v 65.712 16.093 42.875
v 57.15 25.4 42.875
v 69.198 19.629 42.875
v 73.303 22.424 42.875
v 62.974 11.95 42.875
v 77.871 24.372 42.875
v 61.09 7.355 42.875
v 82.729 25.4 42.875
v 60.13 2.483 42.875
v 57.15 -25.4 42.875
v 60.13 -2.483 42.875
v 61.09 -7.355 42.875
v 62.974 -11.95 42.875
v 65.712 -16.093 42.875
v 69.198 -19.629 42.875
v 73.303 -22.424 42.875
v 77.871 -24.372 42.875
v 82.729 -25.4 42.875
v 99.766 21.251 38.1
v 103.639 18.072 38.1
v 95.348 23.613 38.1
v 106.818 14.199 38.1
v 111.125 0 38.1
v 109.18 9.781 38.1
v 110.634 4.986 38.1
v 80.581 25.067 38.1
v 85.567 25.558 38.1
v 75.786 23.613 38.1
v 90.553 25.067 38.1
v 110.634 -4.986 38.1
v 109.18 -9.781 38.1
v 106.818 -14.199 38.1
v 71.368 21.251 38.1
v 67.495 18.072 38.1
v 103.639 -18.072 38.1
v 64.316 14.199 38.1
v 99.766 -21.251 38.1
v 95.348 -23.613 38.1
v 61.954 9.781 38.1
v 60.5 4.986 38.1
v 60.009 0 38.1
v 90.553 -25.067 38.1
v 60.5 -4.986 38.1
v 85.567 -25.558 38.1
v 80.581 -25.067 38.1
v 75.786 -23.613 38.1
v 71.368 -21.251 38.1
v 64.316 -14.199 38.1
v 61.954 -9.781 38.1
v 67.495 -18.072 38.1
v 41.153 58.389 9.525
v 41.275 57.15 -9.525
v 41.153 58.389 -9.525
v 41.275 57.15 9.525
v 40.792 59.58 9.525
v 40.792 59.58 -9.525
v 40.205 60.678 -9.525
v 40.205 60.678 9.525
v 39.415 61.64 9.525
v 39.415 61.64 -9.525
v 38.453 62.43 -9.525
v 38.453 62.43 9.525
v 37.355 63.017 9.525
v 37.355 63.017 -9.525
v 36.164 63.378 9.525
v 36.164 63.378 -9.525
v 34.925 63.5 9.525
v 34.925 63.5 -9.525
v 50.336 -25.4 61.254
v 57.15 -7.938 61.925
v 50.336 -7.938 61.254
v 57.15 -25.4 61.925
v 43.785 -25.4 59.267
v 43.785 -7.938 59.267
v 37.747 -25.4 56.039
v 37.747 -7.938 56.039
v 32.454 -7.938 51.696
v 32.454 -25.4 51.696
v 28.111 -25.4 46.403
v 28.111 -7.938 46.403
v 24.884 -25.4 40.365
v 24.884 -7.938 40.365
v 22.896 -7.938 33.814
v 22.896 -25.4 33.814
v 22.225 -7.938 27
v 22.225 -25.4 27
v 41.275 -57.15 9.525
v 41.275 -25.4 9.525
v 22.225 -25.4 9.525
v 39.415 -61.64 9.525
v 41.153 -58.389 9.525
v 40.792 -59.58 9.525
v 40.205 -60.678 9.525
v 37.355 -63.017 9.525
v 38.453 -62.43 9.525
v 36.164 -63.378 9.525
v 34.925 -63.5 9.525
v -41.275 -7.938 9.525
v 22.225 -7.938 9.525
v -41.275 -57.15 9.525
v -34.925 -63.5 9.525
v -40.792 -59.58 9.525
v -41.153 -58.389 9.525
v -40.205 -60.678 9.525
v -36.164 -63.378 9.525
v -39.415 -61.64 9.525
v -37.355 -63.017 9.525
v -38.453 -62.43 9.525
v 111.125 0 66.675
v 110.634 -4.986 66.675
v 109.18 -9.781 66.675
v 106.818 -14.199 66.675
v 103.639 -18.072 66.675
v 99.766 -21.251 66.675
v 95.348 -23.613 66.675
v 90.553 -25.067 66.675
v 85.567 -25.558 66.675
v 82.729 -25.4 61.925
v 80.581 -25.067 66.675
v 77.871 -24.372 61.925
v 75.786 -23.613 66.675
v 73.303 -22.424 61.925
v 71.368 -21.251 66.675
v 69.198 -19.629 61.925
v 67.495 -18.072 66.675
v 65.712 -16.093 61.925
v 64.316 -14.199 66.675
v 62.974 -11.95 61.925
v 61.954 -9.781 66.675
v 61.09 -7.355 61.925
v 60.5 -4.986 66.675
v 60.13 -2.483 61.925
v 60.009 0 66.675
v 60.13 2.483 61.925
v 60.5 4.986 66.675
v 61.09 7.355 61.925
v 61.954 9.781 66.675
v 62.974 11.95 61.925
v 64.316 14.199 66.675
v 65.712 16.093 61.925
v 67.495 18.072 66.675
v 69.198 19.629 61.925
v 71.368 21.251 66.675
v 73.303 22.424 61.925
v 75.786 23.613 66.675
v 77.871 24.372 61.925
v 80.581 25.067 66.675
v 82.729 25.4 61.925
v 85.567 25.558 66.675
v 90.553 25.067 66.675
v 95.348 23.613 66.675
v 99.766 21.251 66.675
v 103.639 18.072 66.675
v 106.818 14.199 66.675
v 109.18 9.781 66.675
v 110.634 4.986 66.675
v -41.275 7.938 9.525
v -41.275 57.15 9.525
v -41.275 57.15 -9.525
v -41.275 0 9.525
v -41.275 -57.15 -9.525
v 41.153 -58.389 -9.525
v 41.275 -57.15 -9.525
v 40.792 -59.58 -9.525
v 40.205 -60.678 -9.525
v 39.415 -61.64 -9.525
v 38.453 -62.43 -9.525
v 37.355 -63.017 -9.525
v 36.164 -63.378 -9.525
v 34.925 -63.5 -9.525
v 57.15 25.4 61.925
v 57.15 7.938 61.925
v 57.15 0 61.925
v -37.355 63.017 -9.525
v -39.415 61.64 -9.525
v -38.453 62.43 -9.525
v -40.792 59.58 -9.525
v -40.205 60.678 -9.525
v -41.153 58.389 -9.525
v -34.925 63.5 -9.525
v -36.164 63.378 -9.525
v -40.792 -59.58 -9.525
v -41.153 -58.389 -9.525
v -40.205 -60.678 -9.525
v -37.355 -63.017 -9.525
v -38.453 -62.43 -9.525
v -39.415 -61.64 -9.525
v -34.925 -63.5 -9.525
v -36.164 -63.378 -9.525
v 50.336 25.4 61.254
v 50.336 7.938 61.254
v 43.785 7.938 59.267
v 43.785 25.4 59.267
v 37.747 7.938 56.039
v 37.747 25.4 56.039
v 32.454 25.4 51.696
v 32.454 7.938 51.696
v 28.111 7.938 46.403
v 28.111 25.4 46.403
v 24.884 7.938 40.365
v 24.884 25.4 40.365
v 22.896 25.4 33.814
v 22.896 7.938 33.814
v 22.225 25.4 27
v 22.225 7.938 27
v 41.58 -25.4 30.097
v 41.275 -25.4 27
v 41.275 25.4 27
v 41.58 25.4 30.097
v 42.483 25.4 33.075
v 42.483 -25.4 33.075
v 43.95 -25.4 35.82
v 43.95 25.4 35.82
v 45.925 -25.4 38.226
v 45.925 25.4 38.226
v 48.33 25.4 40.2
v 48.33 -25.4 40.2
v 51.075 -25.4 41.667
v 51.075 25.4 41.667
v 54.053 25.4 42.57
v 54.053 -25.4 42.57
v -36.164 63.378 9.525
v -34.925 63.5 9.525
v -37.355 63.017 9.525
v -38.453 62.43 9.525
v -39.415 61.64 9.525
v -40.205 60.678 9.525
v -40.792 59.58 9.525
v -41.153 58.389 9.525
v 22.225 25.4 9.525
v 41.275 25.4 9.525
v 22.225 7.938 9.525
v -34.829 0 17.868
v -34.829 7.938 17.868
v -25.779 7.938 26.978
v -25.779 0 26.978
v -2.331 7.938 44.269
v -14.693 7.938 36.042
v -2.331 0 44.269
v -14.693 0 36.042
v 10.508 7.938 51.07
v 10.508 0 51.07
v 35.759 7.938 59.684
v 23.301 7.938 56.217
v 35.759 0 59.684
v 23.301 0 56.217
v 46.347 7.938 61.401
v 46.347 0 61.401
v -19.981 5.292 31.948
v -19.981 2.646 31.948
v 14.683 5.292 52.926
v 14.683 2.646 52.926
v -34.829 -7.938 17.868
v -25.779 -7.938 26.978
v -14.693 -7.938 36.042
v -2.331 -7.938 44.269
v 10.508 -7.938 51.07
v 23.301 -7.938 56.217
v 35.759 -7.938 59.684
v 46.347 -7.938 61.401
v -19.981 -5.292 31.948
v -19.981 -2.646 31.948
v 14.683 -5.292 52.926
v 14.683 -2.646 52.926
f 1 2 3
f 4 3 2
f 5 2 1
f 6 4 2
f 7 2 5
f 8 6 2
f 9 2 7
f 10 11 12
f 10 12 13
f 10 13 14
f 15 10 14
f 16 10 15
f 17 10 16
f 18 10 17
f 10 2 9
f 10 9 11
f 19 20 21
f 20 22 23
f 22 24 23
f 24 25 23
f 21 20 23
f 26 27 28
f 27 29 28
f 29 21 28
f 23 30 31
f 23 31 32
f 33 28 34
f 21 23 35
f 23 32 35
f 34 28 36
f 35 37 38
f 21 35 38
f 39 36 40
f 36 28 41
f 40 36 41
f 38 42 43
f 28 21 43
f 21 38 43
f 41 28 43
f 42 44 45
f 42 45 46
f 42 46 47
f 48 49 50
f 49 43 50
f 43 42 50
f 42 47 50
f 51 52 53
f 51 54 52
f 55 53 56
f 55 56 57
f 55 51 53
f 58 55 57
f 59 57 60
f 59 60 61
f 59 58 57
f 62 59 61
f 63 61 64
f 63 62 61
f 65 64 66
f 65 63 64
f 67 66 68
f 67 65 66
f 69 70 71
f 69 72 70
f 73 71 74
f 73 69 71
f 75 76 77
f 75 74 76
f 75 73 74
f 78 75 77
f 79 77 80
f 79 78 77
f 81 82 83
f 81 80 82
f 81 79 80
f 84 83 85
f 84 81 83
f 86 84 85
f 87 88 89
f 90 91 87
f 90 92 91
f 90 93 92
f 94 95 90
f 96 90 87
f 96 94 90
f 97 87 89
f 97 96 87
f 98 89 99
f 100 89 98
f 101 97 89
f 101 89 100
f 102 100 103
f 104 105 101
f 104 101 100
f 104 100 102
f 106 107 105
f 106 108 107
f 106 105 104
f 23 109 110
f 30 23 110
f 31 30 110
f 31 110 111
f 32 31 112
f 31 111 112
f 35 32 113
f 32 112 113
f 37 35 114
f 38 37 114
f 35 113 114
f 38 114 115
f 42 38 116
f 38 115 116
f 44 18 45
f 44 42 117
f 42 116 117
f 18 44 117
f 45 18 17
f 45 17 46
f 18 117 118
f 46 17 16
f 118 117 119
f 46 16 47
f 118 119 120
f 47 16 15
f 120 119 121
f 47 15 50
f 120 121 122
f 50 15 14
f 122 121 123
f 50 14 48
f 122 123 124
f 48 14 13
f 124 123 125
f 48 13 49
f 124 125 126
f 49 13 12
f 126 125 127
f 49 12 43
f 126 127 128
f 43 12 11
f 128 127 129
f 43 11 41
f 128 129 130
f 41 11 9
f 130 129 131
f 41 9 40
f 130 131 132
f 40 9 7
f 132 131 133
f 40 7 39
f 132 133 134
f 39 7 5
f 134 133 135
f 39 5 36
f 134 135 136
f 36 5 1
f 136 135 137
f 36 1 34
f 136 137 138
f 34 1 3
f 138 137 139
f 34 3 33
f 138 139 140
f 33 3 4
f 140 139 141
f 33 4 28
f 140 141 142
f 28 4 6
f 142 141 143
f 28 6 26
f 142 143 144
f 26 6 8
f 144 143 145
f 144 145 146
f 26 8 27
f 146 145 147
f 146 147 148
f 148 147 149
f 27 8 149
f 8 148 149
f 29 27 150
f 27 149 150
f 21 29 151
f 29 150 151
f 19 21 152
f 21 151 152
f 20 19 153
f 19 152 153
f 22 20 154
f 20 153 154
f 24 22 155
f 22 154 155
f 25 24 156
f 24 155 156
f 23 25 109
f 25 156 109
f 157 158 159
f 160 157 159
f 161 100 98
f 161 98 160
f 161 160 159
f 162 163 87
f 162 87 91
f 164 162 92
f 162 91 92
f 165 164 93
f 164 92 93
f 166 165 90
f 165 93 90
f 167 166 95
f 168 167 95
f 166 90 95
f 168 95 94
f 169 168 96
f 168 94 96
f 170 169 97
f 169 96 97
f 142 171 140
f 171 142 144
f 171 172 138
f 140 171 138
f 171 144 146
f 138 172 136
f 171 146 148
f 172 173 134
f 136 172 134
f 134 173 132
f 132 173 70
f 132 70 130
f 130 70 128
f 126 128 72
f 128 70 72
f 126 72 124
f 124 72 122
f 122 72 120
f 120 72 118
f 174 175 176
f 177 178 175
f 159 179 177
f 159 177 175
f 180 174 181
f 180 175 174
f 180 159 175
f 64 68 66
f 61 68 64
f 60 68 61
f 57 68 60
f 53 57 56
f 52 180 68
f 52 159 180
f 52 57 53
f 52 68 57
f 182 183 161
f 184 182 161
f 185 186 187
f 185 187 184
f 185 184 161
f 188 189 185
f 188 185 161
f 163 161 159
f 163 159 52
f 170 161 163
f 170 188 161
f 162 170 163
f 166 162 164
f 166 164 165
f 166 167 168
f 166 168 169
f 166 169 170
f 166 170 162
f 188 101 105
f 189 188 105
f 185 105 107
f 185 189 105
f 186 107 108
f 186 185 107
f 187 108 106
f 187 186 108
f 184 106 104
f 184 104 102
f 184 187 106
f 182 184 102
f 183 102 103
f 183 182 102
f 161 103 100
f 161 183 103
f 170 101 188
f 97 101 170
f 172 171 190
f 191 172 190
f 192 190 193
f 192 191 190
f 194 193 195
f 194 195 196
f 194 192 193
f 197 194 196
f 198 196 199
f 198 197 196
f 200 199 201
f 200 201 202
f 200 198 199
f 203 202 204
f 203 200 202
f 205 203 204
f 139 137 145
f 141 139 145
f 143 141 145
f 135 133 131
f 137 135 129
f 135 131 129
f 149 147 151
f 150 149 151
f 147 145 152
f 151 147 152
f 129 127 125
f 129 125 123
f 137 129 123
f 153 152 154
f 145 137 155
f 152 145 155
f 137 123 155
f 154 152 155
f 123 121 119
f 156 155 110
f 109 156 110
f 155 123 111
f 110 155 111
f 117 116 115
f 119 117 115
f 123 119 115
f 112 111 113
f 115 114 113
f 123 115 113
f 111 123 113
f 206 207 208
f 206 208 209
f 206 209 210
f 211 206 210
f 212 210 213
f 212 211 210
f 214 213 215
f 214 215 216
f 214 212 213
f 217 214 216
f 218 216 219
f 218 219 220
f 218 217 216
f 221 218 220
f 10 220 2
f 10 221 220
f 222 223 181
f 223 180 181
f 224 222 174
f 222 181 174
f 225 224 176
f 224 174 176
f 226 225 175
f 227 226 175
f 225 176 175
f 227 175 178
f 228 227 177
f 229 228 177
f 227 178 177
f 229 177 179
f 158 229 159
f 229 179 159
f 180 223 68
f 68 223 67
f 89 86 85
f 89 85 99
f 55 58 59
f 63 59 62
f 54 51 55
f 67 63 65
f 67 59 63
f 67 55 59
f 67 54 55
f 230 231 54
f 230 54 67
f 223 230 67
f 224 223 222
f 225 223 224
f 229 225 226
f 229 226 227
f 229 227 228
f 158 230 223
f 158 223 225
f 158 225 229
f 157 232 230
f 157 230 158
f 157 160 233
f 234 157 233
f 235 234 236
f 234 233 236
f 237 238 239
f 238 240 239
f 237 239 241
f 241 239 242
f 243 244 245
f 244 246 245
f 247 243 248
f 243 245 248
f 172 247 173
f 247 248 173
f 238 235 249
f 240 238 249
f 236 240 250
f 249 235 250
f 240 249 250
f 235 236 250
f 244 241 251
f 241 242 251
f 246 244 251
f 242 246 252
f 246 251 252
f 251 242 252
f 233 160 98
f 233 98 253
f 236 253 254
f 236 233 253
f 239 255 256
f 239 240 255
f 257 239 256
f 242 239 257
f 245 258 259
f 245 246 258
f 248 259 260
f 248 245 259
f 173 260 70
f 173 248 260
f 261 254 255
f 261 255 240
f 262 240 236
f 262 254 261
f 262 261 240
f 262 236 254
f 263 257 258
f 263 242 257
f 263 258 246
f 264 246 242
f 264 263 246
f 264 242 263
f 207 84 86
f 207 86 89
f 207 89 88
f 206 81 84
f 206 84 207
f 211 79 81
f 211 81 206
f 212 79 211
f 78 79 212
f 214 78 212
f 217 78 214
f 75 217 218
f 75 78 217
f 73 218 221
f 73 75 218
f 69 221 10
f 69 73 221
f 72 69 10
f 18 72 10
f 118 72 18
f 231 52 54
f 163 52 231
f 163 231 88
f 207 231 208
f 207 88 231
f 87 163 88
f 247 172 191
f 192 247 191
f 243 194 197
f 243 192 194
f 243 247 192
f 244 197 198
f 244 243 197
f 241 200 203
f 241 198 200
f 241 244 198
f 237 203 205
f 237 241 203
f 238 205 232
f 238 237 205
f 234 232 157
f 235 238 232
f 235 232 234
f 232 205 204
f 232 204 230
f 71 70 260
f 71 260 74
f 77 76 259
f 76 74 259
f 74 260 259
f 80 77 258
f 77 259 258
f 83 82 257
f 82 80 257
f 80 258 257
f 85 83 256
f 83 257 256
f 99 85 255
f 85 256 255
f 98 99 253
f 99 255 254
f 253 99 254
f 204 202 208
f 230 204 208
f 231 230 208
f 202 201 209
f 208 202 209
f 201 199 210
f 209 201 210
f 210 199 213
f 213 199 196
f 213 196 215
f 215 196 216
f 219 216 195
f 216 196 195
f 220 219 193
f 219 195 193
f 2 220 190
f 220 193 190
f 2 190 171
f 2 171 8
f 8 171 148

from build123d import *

# Parameters (mm, degrees)
F1_DEPTH = 63.5
F2_DEPTH = 7.9375
F3_DEPTH = 25.4
F0_W     = 25.2419677258
F0_H     = 19.05
F4_DEPTH = 25.4
F6_R     = 6.35


# Not quite as in the source:
# - a feature names something its author has since deleted; it is built from what else it names


with BuildPart() as f1:
    # F0 (on Front) → F1 (new body, symmetric)
    with BuildSketch(Plane.XZ):
        Polygon((-41.275, 9.525), (-41.275, -9.525), (41.275, -9.525), (41.275, 9.525), (22.225, 9.525), align=None)
    extrude(amount=F1_DEPTH, both=True)

    # F0 (on Front) → F2 (join, symmetric)
    with BuildSketch(Plane.XZ):
        with BuildLine():
            add(Edge.make_bspline(
                [(-41.275, 9.525), (-28.5215713084, 29.158225283), (12.6376561821, 62.4269843102), (57.15, 61.9252)],
                knots=[0, 0, 0, 0, 111.5045361635, 111.5045361635, 111.5045361635, 111.5045361635], degree=3))
            Line((-41.275, 9.525), (22.225, 9.525))
            Line((22.225, 9.525), (22.225, 27.0002))
            ThreePointArc((22.225, 27.0002), (32.4542956671, 51.6959043329), (57.15, 61.9252))
        make_face()
    extrude(amount=F2_DEPTH, both=True)

    # F0 (on Front) → F3 (join, symmetric)
    with BuildSketch(Plane.XZ):
        with BuildLine():
            Line((22.225, 9.525), (41.275, 9.525))
            Line((41.275, 9.525), (41.275, 27.0002))
            ThreePointArc((41.275, 27.0002), (45.9246798487, 38.2255201513), (57.15, 42.8752))
            Line((57.15, 42.8752), (60.325, 42.8752))
            Line((60.325, 42.8752), (60.325, 61.9252))
            Line((60.325, 61.9252), (57.15, 61.9252))
            ThreePointArc((57.15, 61.9252), (32.4542956671, 51.6959043329), (22.225, 27.0002))
            Line((22.225, 27.0002), (22.225, 9.525))
        make_face()
    extrude(amount=F3_DEPTH, both=True)

    # F0 (on Front) → F4 (join, symmetric)
    with BuildSketch(Plane.XZ):
        with Locations((72.9459838629, 52.4002)):
            Rectangle(F0_W, F0_H)
    extrude(amount=F4_DEPTH, both=True)

    # F0 (on Front) → F5 (revolve)
    with BuildSketch(Plane.XZ):
        Polygon((85.5669677258, 66.675), (85.5669677258, 61.9252), (85.5669677258, 42.8752), (85.5669677258, 38.1), (111.125, 38.1), (111.125, 66.675), align=None)
    revolve(axis=Axis((85.5669677258, 0, 52.3875), (0, 0, -1)))

    # F6
    f6_edges = [f1.edges().sort_by_distance(p)[0] for p in [
        (-41.275, -63.5, 0),
        (41.275, -63.5, 0),
        (41.275, 63.5, 0),
        (-41.275, 63.5, 0),
    ]]
    fillet(f6_edges, radius=F6_R)


solid = f1.part
